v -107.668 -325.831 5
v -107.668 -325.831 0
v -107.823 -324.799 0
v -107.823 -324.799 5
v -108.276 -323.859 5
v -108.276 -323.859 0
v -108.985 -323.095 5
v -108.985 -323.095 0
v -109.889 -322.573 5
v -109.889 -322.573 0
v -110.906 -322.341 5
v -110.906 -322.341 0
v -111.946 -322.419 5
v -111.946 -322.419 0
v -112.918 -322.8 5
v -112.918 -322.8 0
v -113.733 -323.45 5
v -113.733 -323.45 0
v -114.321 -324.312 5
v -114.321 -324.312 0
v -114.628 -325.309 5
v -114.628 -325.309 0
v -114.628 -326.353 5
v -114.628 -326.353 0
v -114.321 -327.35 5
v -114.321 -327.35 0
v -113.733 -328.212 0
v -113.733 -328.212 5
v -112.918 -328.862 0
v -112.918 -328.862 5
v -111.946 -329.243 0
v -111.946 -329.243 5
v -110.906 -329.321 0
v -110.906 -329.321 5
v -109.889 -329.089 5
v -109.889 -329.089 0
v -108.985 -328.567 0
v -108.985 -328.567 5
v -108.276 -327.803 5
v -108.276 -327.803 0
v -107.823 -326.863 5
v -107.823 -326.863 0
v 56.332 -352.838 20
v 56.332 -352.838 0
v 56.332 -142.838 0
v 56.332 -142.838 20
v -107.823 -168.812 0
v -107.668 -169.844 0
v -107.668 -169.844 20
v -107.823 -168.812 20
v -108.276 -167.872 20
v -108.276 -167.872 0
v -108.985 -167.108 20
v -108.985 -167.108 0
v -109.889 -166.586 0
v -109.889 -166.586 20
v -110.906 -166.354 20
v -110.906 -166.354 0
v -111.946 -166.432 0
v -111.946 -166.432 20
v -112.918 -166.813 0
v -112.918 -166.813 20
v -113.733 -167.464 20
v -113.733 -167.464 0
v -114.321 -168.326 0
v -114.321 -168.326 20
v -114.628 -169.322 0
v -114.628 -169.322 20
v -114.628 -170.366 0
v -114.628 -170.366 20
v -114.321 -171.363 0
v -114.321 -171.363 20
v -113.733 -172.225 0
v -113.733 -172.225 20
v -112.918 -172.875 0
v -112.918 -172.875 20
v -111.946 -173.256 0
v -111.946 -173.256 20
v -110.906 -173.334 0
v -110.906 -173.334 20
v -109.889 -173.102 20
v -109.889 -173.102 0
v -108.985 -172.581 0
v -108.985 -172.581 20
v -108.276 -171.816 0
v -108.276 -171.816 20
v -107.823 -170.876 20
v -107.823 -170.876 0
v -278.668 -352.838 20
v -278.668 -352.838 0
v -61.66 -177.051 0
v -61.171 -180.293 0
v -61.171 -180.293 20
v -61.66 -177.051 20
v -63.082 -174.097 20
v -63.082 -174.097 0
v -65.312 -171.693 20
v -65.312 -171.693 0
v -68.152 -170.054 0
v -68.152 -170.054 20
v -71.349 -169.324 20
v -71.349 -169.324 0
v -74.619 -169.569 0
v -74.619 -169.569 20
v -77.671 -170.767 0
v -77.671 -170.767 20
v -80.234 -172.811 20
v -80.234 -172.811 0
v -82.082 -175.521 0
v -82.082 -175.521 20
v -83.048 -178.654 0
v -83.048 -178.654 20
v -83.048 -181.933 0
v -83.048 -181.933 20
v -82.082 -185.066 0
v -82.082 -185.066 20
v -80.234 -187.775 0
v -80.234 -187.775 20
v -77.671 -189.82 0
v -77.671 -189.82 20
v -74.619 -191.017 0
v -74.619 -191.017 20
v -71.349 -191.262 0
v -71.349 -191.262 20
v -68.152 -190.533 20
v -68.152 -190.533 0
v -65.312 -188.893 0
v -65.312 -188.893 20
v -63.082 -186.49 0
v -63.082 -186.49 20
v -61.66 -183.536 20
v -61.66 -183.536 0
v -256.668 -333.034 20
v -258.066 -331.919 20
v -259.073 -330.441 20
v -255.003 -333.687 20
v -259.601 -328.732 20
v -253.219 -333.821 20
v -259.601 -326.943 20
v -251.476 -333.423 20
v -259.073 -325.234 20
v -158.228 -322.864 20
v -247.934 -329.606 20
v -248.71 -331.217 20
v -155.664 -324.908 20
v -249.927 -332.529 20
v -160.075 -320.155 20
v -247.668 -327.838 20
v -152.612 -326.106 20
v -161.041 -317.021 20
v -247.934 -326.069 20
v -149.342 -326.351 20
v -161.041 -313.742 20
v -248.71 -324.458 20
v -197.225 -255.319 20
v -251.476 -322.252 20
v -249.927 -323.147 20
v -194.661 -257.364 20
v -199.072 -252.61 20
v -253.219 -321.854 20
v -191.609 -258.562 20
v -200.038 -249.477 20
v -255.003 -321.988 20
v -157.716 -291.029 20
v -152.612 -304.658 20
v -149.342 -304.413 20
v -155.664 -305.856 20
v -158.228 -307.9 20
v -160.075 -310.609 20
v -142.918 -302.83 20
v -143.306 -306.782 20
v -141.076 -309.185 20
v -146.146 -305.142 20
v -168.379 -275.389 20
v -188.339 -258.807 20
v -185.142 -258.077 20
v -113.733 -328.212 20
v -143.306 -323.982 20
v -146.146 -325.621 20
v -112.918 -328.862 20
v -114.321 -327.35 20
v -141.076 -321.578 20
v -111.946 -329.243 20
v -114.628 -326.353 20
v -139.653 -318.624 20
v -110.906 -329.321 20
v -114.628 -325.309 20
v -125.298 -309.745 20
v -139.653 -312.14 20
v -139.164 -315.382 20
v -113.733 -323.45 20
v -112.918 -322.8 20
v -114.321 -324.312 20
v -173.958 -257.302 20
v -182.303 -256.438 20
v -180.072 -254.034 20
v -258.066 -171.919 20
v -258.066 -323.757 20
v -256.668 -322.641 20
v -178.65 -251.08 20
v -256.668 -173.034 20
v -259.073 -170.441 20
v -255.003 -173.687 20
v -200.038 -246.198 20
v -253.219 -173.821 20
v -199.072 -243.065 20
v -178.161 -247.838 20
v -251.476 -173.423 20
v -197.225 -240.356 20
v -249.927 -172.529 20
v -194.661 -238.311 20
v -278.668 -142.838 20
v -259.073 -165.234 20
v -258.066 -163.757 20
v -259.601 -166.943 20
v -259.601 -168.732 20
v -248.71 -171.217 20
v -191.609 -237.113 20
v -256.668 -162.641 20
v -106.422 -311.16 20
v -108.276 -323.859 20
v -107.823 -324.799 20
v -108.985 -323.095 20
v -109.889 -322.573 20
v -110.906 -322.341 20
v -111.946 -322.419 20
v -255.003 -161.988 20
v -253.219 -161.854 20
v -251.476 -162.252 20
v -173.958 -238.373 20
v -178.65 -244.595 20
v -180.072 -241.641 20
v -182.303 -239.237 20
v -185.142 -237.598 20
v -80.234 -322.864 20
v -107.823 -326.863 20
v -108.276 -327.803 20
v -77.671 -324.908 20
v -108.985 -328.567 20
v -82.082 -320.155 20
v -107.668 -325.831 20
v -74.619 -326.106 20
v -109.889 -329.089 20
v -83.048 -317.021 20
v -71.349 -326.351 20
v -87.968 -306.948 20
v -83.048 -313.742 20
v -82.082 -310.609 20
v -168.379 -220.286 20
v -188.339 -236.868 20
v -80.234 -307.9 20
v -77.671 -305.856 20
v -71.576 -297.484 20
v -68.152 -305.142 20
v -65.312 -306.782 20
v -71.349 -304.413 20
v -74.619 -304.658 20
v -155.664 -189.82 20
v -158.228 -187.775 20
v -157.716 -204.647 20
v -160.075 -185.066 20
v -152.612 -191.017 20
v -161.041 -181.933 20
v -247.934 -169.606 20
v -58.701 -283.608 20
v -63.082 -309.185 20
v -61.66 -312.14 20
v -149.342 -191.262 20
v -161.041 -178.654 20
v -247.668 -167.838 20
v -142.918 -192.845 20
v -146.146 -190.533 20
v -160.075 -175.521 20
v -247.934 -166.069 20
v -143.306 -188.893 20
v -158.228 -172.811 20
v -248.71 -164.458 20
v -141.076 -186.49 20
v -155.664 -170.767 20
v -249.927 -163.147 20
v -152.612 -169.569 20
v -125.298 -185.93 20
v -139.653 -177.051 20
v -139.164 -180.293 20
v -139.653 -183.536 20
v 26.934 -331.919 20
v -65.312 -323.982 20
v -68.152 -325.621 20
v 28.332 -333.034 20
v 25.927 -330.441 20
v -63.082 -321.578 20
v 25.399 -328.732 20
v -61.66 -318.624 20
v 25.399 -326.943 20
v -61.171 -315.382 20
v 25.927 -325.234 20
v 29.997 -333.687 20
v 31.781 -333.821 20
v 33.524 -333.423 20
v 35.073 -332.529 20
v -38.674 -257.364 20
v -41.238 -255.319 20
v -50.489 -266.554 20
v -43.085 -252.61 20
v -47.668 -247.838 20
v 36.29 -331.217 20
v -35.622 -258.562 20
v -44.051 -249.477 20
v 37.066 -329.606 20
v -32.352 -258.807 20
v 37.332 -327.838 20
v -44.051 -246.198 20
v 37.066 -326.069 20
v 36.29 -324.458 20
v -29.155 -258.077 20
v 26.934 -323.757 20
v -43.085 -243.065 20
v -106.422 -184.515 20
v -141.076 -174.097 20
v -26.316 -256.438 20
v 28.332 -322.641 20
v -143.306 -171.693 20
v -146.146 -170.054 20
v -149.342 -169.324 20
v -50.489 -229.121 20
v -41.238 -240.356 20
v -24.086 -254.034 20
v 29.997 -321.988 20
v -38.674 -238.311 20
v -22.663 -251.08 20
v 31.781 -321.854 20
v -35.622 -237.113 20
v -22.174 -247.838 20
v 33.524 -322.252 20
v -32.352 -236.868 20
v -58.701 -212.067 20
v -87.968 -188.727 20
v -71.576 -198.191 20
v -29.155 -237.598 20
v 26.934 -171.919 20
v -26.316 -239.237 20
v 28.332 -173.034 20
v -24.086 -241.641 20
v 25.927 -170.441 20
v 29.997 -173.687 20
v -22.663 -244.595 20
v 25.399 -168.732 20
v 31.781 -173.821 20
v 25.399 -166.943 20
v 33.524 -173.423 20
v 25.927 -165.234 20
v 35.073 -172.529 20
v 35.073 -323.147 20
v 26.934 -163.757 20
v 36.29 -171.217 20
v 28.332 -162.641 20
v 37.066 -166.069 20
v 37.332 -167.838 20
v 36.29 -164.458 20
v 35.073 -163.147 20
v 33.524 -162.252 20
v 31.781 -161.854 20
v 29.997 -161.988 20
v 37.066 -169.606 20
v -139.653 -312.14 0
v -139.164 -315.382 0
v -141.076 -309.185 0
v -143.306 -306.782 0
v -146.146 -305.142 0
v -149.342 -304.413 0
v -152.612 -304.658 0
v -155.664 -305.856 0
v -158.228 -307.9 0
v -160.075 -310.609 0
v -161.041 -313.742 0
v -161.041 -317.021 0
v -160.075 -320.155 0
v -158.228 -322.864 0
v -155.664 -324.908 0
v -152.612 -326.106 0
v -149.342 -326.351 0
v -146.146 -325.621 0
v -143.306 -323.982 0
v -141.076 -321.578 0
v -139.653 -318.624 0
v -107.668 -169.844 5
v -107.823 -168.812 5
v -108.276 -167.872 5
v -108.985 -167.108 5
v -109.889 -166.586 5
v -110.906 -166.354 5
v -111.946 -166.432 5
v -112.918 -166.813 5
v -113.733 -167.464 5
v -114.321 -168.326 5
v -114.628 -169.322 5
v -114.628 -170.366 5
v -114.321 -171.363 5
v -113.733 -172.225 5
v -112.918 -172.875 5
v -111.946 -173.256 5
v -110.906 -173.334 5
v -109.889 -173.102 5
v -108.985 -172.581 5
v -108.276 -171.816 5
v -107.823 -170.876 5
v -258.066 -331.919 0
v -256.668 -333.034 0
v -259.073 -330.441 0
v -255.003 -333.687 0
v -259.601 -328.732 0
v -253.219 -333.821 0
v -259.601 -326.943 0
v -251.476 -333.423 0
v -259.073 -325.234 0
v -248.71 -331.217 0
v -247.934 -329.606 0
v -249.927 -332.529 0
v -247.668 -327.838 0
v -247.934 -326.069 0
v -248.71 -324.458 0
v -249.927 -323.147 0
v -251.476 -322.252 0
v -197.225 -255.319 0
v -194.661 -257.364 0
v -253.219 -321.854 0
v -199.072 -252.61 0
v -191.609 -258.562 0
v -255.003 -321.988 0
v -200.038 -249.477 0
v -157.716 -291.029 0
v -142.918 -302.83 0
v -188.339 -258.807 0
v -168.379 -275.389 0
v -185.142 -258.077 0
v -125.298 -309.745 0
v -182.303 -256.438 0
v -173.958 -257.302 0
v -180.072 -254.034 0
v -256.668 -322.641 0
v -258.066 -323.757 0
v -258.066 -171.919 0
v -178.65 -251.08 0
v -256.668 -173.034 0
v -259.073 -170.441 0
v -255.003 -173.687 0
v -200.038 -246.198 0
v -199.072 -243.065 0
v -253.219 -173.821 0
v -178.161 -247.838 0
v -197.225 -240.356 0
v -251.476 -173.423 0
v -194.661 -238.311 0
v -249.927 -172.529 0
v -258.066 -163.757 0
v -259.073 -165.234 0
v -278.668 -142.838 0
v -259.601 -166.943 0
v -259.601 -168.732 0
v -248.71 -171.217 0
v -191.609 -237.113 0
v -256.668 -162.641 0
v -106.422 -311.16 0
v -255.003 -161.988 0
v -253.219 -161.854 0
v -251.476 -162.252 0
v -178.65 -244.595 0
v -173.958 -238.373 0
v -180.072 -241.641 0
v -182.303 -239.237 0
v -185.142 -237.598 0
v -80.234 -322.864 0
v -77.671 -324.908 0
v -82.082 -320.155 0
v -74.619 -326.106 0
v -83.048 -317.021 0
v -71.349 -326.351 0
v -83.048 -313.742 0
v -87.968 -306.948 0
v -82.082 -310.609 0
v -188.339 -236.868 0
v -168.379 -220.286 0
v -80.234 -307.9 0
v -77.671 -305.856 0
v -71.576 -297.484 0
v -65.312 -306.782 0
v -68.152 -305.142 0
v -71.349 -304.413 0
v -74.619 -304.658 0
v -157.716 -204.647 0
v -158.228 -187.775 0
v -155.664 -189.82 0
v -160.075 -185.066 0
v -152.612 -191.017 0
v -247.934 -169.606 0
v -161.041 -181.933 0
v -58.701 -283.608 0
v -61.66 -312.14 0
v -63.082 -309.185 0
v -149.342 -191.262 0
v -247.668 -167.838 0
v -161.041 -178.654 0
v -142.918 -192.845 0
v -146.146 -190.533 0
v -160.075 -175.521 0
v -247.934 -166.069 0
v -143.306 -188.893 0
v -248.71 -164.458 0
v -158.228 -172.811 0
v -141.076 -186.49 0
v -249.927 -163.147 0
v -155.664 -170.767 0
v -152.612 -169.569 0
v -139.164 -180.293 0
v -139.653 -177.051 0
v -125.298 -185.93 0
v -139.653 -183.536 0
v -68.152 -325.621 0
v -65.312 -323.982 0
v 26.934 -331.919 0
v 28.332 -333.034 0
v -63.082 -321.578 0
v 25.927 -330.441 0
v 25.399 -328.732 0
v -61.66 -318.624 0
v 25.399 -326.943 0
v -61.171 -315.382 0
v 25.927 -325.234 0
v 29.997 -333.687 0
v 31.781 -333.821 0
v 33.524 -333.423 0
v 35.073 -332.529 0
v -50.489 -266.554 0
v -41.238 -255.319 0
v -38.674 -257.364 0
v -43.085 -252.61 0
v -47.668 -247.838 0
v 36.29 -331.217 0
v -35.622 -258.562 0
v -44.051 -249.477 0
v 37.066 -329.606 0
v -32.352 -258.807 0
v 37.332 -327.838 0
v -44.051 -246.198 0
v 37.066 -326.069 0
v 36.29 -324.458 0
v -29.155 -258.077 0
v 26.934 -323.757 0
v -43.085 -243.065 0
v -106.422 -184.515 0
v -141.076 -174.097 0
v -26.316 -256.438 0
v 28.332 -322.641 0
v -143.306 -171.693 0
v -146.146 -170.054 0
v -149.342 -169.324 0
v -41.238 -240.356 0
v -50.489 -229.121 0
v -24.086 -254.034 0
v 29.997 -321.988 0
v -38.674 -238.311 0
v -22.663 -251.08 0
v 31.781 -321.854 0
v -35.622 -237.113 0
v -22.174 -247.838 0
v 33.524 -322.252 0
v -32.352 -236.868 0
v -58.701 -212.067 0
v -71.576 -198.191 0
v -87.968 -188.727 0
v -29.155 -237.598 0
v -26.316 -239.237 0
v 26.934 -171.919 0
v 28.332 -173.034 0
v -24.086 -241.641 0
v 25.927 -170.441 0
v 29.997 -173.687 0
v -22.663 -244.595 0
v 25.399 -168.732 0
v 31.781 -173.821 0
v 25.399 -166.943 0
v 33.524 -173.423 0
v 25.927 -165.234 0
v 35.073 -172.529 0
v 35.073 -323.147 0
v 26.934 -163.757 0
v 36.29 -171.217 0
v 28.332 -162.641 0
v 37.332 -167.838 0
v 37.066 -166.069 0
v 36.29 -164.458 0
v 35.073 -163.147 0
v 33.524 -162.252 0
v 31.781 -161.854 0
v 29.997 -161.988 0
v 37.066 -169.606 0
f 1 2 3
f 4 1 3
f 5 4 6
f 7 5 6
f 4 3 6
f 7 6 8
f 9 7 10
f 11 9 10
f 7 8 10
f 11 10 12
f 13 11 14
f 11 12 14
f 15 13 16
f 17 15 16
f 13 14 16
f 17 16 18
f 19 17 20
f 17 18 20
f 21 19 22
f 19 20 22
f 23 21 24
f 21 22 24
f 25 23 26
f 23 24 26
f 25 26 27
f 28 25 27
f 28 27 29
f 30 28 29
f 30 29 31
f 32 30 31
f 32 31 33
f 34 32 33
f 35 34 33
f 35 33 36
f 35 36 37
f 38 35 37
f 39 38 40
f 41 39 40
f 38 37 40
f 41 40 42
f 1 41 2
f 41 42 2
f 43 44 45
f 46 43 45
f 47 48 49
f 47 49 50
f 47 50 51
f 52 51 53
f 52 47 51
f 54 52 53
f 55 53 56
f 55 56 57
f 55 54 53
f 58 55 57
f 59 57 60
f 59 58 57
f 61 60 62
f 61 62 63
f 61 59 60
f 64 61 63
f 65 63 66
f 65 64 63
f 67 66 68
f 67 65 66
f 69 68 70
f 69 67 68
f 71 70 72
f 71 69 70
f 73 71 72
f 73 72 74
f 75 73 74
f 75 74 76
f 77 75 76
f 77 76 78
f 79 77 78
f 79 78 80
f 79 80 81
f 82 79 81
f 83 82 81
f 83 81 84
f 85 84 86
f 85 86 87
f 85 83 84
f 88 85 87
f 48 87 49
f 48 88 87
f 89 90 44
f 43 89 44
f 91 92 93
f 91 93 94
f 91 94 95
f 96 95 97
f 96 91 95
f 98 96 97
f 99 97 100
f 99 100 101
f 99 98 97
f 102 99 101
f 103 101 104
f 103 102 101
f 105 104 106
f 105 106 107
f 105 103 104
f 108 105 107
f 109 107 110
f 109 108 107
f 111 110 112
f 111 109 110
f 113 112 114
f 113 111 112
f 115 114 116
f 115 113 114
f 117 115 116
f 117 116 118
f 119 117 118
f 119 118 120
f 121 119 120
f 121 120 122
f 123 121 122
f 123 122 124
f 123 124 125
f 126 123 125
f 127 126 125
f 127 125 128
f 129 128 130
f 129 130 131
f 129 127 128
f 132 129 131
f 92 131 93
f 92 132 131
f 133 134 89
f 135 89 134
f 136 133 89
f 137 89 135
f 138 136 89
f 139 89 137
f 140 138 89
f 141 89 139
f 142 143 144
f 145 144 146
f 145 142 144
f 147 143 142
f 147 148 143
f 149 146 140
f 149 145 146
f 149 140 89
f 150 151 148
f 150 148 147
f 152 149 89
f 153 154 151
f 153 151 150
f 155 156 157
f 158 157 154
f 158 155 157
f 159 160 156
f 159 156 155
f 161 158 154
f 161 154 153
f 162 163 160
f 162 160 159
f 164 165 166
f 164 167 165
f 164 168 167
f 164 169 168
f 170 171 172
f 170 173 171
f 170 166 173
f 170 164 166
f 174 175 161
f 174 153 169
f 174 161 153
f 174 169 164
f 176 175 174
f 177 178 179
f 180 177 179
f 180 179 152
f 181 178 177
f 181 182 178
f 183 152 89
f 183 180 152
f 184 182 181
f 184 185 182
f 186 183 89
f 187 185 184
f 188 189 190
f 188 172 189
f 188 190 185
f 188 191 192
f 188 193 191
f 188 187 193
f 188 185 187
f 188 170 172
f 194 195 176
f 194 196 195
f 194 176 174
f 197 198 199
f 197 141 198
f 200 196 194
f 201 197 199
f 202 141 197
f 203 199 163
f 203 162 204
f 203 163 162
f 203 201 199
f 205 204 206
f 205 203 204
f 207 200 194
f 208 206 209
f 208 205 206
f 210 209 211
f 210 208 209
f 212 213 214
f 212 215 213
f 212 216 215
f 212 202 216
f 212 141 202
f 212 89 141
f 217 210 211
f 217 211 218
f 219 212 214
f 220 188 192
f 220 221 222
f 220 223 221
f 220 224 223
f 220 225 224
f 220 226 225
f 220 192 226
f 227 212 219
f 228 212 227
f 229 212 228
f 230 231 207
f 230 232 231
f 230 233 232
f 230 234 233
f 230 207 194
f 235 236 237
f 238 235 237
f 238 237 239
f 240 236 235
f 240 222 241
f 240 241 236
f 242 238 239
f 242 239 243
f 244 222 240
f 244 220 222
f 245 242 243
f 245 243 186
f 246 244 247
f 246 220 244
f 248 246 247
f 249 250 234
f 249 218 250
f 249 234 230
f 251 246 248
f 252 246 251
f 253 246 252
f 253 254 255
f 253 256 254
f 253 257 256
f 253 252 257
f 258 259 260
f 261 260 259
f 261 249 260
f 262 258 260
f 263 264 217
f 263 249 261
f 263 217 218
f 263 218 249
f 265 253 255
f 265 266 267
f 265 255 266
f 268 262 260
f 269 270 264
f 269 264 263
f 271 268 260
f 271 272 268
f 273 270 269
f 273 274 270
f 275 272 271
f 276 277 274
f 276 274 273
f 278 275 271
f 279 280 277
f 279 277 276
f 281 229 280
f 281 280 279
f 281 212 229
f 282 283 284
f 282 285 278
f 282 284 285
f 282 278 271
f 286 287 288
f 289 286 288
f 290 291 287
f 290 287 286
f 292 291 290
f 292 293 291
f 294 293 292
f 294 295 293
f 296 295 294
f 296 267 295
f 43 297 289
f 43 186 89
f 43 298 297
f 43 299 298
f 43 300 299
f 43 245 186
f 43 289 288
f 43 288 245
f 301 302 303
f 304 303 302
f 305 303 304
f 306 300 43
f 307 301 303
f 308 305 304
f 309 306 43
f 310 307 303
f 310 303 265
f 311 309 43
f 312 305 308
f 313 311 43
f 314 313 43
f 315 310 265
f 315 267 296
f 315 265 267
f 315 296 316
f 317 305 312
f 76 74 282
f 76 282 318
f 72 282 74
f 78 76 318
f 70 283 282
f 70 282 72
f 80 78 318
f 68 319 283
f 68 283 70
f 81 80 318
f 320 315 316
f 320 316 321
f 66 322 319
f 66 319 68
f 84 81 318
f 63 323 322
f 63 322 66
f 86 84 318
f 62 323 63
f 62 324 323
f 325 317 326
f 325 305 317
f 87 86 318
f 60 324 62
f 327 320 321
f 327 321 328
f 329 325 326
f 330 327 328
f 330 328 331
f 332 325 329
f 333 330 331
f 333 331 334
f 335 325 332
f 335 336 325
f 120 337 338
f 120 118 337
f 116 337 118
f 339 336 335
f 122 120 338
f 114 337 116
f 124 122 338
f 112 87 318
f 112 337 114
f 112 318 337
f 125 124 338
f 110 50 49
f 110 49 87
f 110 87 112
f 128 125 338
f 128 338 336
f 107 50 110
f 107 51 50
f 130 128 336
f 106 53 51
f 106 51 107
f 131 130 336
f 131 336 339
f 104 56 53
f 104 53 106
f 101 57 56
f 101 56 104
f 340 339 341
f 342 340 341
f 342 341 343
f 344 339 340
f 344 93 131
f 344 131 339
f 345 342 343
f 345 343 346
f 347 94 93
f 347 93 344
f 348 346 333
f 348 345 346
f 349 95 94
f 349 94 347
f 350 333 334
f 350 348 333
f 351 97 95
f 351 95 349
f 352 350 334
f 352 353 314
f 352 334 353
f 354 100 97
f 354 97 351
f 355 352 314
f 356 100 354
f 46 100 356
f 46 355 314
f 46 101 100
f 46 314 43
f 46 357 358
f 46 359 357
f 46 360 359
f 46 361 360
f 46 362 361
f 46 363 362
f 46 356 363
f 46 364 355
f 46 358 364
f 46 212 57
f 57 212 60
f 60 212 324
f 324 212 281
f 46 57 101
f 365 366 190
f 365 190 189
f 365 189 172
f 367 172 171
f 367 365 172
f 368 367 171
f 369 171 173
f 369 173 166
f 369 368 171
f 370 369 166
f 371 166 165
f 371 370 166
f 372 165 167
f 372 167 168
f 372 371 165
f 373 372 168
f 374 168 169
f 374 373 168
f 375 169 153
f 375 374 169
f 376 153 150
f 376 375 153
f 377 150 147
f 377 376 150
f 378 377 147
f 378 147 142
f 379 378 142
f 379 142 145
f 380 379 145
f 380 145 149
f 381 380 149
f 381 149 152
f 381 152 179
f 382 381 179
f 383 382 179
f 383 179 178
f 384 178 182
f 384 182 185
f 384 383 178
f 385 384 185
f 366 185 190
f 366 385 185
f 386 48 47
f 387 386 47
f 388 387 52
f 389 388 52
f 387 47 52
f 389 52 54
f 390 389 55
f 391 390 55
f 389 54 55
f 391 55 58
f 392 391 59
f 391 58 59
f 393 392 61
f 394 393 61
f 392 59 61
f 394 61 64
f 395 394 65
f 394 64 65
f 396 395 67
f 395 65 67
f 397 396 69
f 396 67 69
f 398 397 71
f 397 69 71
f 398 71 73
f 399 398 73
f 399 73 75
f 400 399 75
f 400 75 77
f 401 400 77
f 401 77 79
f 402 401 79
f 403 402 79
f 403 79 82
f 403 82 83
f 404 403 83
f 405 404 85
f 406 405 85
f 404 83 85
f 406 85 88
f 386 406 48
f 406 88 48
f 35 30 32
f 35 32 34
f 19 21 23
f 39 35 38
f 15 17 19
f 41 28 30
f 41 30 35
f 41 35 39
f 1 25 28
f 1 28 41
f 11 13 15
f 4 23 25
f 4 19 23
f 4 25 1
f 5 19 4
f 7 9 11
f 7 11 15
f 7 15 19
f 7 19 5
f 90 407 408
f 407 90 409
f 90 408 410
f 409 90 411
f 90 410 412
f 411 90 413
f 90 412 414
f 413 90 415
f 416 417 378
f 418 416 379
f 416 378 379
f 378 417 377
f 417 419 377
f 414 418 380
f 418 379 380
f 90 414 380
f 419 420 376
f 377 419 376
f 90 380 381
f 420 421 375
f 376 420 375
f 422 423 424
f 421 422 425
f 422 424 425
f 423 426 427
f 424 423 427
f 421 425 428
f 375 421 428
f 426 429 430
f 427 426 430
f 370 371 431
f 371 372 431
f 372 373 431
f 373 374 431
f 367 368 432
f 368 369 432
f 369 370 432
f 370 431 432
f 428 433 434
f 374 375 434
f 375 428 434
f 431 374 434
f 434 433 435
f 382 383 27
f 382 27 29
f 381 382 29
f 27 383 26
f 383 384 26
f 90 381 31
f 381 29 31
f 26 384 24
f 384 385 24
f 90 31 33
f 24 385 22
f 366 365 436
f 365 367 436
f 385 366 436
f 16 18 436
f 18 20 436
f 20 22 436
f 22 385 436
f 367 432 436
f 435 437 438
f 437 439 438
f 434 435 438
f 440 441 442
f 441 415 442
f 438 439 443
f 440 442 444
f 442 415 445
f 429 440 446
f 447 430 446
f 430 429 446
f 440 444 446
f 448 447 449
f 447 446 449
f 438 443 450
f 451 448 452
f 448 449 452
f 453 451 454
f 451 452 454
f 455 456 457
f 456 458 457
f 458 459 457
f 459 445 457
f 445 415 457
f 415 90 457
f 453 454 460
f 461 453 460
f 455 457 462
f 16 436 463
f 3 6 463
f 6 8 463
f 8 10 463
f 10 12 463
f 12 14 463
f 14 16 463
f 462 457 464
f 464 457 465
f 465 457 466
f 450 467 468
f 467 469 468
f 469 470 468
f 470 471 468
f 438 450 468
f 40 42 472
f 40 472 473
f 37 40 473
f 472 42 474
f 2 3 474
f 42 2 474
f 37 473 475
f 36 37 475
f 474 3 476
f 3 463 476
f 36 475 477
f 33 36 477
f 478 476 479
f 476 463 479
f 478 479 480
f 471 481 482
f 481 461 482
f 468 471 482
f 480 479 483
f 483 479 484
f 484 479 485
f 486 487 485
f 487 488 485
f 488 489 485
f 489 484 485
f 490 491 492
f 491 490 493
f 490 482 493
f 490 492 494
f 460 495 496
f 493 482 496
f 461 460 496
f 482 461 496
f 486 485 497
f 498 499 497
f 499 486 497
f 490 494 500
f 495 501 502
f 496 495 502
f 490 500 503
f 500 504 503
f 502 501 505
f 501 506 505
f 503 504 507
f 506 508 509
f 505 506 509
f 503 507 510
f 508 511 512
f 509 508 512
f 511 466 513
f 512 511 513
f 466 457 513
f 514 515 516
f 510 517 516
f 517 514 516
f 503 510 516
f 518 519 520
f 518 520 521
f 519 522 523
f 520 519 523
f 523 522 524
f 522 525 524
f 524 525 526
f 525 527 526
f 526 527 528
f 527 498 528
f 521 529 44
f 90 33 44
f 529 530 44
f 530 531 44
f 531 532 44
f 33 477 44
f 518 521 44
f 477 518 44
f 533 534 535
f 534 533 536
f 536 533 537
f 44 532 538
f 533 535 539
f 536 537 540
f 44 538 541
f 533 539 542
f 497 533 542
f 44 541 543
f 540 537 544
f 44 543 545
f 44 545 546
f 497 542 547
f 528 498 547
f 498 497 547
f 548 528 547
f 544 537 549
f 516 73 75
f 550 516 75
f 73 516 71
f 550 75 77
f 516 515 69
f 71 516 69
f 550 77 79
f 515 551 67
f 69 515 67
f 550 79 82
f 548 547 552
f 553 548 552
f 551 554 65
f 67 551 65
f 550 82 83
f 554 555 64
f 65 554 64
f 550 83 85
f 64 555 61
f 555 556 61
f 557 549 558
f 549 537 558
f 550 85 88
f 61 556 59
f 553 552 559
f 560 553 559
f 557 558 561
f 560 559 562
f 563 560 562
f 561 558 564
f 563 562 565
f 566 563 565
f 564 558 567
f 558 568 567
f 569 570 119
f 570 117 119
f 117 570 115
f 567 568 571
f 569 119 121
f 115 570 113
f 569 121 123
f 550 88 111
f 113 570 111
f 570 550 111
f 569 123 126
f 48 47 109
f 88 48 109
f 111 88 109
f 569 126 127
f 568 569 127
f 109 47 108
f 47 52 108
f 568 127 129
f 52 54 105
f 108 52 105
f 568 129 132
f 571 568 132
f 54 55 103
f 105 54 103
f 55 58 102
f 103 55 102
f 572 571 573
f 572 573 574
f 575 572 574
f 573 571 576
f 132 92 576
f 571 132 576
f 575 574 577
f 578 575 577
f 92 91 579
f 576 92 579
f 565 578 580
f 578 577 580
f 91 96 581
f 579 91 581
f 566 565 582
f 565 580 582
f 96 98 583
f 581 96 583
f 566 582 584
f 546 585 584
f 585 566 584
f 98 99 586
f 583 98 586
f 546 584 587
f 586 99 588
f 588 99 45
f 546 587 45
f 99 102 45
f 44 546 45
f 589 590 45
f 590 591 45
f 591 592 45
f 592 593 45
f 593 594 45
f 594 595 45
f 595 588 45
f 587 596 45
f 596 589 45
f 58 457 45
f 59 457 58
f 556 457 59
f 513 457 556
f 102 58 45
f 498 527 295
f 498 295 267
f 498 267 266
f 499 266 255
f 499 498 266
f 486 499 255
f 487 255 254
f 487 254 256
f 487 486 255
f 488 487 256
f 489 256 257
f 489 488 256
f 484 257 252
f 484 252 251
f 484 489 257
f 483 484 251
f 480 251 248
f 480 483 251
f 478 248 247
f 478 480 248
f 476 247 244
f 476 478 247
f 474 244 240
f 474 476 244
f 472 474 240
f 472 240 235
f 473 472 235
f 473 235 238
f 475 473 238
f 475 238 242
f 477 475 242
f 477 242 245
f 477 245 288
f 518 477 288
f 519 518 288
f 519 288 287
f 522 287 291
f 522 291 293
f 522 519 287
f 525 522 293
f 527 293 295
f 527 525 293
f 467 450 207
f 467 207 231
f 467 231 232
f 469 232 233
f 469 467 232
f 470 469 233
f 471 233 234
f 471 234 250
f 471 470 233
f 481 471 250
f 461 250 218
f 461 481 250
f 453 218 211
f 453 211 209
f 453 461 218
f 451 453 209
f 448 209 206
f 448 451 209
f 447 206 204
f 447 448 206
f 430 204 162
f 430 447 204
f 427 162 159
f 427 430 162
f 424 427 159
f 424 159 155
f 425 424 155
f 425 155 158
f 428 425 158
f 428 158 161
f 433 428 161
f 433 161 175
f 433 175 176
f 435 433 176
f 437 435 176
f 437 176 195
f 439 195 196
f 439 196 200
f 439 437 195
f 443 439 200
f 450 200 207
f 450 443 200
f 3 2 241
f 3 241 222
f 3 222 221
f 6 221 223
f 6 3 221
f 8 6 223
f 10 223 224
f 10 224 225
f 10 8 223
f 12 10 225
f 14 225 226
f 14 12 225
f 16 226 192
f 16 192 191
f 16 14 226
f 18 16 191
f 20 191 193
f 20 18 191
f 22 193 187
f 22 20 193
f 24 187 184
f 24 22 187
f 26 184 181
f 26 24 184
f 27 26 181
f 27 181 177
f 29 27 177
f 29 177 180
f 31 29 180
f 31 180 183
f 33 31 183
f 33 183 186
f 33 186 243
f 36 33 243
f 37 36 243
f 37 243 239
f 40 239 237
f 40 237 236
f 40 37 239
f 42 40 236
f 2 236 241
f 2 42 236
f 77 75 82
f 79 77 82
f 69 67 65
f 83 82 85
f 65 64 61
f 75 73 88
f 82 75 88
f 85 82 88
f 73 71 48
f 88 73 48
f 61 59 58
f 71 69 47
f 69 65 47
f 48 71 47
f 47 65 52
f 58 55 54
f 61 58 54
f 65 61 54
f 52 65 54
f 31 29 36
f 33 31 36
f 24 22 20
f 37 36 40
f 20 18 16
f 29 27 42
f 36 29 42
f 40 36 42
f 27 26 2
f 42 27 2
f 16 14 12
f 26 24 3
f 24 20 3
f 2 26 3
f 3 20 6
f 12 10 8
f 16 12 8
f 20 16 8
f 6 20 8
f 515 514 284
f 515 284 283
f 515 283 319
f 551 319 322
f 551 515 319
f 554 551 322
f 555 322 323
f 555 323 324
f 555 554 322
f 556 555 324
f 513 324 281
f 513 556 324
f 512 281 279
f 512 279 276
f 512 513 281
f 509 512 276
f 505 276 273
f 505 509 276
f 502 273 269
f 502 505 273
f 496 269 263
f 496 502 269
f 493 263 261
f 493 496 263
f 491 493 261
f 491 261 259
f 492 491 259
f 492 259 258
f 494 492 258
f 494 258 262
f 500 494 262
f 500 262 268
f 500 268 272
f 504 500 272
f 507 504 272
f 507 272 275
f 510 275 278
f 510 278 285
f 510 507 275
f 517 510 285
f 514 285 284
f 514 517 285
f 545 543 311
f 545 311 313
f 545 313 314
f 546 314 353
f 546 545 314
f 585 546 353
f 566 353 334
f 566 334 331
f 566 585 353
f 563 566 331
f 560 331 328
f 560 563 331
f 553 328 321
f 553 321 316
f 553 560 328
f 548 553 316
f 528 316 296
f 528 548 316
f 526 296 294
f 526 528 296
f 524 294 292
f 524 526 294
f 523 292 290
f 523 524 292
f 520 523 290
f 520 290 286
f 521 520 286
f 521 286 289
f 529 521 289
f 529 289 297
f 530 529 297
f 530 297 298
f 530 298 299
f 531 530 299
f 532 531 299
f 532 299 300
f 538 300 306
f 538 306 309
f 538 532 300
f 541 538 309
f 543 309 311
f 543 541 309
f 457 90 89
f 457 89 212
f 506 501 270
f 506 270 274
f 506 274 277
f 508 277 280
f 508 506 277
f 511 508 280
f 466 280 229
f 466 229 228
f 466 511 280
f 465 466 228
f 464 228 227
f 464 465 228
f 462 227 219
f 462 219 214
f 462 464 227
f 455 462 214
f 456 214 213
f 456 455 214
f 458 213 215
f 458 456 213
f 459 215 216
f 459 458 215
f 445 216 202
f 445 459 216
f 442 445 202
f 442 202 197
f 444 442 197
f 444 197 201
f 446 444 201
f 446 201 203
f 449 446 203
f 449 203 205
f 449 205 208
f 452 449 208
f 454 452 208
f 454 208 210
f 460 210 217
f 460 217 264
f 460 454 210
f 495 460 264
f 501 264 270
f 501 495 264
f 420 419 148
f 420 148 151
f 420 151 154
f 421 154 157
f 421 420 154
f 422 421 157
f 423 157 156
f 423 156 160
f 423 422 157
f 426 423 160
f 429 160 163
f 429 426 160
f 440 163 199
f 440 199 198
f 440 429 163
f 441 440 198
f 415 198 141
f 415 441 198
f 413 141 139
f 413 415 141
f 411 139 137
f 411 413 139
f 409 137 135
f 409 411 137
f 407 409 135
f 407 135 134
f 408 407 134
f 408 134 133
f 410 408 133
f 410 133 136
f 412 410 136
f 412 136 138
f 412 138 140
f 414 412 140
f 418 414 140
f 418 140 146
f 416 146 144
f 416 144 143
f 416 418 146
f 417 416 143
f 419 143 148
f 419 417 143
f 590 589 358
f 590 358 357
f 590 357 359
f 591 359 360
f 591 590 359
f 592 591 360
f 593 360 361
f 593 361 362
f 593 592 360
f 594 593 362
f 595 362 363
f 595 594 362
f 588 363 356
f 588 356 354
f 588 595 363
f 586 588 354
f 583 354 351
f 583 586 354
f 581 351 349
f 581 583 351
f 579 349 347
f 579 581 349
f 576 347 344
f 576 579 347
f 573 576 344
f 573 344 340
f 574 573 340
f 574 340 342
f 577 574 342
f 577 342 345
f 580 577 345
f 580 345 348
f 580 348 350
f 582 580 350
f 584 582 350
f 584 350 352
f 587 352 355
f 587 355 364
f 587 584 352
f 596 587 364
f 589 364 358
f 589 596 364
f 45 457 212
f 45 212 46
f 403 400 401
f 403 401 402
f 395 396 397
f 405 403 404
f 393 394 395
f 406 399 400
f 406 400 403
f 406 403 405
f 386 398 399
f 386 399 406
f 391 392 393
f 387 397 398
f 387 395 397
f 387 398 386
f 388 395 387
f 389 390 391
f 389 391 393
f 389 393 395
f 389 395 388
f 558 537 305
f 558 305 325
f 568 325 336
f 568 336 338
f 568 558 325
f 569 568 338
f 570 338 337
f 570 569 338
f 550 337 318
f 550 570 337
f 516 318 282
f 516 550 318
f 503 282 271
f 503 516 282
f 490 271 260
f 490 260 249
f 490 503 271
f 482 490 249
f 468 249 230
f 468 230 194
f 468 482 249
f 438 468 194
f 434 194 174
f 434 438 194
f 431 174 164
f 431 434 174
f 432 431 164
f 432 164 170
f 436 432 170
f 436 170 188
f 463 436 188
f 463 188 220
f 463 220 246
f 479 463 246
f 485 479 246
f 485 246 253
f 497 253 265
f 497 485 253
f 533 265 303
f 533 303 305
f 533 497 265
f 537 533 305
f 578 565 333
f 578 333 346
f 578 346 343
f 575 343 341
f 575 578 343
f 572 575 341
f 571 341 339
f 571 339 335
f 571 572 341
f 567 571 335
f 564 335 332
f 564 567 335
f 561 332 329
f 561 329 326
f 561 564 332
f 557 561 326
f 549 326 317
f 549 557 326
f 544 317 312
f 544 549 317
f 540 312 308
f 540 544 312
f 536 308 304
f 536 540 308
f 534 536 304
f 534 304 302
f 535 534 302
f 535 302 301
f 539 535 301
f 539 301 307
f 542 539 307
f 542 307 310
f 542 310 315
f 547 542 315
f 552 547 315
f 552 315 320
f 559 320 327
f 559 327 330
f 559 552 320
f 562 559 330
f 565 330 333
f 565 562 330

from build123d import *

# Parameters (mm, degrees)
F0_W     = 335
F0_H     = 210
F0_R     = 6
F0_R_2   = 11
F0_R_3   = 3.5
F0_R_4   = 63.5
F1_DEPTH = 20
F2_DEPTH = 5


with BuildPart() as f1:
    # F0 (on Top) → F1 (new body)
    with BuildSketch(Plane.XY):
        with Locations((-111.167585, -247.83754)):
            Rectangle(F0_W, F0_H)
        with Locations((-253.667585, -327.83754)):
            Circle(F0_R, mode=Mode.SUBTRACT)
        with Locations((-150.164311, -315.381851)):
            Circle(F0_R_2, mode=Mode.SUBTRACT)
        with Locations((-111.167585, -325.830972)):
            Circle(F0_R_3, mode=Mode.SUBTRACT)
        with Locations((-111.167585, -247.83754)):
            Circle(F0_R_4, mode=Mode.SUBTRACT)
        with Locations((-72.170858, -315.381851)):
            Circle(F0_R_2, mode=Mode.SUBTRACT)
        with Locations((31.332415, -327.83754)):
            Circle(F0_R, mode=Mode.SUBTRACT)
        with Locations((-189.161038, -247.83754)):
            Circle(F0_R_2, mode=Mode.SUBTRACT)
        with Locations((-253.667585, -167.83754)):
            Circle(F0_R, mode=Mode.SUBTRACT)
        with Locations((-150.164311, -180.293228)):
            Circle(F0_R_2, mode=Mode.SUBTRACT)
        with Locations((-111.167585, -169.844107)):
            Circle(F0_R_3, mode=Mode.SUBTRACT)
        with Locations((-33.174132, -247.83754)):
            Circle(F0_R_2, mode=Mode.SUBTRACT)
        with Locations((-72.170858, -180.293228)):
            Circle(F0_R_2, mode=Mode.SUBTRACT)
        with Locations((31.332415, -167.83754)):
            Circle(F0_R, mode=Mode.SUBTRACT)
    extrude(amount=F1_DEPTH)


with BuildPart() as f2:
    # F0 (on Top) → F2 (new body)
    with BuildSketch(Plane.XY):
        with Locations((-111.167585, -169.844107)):
            Circle(F0_R_3)
        with Locations((-111.167585, -325.830972)):
            Circle(F0_R_3)
    extrude(amount=F2_DEPTH)


solid = Compound([f1.part, f2.part])
